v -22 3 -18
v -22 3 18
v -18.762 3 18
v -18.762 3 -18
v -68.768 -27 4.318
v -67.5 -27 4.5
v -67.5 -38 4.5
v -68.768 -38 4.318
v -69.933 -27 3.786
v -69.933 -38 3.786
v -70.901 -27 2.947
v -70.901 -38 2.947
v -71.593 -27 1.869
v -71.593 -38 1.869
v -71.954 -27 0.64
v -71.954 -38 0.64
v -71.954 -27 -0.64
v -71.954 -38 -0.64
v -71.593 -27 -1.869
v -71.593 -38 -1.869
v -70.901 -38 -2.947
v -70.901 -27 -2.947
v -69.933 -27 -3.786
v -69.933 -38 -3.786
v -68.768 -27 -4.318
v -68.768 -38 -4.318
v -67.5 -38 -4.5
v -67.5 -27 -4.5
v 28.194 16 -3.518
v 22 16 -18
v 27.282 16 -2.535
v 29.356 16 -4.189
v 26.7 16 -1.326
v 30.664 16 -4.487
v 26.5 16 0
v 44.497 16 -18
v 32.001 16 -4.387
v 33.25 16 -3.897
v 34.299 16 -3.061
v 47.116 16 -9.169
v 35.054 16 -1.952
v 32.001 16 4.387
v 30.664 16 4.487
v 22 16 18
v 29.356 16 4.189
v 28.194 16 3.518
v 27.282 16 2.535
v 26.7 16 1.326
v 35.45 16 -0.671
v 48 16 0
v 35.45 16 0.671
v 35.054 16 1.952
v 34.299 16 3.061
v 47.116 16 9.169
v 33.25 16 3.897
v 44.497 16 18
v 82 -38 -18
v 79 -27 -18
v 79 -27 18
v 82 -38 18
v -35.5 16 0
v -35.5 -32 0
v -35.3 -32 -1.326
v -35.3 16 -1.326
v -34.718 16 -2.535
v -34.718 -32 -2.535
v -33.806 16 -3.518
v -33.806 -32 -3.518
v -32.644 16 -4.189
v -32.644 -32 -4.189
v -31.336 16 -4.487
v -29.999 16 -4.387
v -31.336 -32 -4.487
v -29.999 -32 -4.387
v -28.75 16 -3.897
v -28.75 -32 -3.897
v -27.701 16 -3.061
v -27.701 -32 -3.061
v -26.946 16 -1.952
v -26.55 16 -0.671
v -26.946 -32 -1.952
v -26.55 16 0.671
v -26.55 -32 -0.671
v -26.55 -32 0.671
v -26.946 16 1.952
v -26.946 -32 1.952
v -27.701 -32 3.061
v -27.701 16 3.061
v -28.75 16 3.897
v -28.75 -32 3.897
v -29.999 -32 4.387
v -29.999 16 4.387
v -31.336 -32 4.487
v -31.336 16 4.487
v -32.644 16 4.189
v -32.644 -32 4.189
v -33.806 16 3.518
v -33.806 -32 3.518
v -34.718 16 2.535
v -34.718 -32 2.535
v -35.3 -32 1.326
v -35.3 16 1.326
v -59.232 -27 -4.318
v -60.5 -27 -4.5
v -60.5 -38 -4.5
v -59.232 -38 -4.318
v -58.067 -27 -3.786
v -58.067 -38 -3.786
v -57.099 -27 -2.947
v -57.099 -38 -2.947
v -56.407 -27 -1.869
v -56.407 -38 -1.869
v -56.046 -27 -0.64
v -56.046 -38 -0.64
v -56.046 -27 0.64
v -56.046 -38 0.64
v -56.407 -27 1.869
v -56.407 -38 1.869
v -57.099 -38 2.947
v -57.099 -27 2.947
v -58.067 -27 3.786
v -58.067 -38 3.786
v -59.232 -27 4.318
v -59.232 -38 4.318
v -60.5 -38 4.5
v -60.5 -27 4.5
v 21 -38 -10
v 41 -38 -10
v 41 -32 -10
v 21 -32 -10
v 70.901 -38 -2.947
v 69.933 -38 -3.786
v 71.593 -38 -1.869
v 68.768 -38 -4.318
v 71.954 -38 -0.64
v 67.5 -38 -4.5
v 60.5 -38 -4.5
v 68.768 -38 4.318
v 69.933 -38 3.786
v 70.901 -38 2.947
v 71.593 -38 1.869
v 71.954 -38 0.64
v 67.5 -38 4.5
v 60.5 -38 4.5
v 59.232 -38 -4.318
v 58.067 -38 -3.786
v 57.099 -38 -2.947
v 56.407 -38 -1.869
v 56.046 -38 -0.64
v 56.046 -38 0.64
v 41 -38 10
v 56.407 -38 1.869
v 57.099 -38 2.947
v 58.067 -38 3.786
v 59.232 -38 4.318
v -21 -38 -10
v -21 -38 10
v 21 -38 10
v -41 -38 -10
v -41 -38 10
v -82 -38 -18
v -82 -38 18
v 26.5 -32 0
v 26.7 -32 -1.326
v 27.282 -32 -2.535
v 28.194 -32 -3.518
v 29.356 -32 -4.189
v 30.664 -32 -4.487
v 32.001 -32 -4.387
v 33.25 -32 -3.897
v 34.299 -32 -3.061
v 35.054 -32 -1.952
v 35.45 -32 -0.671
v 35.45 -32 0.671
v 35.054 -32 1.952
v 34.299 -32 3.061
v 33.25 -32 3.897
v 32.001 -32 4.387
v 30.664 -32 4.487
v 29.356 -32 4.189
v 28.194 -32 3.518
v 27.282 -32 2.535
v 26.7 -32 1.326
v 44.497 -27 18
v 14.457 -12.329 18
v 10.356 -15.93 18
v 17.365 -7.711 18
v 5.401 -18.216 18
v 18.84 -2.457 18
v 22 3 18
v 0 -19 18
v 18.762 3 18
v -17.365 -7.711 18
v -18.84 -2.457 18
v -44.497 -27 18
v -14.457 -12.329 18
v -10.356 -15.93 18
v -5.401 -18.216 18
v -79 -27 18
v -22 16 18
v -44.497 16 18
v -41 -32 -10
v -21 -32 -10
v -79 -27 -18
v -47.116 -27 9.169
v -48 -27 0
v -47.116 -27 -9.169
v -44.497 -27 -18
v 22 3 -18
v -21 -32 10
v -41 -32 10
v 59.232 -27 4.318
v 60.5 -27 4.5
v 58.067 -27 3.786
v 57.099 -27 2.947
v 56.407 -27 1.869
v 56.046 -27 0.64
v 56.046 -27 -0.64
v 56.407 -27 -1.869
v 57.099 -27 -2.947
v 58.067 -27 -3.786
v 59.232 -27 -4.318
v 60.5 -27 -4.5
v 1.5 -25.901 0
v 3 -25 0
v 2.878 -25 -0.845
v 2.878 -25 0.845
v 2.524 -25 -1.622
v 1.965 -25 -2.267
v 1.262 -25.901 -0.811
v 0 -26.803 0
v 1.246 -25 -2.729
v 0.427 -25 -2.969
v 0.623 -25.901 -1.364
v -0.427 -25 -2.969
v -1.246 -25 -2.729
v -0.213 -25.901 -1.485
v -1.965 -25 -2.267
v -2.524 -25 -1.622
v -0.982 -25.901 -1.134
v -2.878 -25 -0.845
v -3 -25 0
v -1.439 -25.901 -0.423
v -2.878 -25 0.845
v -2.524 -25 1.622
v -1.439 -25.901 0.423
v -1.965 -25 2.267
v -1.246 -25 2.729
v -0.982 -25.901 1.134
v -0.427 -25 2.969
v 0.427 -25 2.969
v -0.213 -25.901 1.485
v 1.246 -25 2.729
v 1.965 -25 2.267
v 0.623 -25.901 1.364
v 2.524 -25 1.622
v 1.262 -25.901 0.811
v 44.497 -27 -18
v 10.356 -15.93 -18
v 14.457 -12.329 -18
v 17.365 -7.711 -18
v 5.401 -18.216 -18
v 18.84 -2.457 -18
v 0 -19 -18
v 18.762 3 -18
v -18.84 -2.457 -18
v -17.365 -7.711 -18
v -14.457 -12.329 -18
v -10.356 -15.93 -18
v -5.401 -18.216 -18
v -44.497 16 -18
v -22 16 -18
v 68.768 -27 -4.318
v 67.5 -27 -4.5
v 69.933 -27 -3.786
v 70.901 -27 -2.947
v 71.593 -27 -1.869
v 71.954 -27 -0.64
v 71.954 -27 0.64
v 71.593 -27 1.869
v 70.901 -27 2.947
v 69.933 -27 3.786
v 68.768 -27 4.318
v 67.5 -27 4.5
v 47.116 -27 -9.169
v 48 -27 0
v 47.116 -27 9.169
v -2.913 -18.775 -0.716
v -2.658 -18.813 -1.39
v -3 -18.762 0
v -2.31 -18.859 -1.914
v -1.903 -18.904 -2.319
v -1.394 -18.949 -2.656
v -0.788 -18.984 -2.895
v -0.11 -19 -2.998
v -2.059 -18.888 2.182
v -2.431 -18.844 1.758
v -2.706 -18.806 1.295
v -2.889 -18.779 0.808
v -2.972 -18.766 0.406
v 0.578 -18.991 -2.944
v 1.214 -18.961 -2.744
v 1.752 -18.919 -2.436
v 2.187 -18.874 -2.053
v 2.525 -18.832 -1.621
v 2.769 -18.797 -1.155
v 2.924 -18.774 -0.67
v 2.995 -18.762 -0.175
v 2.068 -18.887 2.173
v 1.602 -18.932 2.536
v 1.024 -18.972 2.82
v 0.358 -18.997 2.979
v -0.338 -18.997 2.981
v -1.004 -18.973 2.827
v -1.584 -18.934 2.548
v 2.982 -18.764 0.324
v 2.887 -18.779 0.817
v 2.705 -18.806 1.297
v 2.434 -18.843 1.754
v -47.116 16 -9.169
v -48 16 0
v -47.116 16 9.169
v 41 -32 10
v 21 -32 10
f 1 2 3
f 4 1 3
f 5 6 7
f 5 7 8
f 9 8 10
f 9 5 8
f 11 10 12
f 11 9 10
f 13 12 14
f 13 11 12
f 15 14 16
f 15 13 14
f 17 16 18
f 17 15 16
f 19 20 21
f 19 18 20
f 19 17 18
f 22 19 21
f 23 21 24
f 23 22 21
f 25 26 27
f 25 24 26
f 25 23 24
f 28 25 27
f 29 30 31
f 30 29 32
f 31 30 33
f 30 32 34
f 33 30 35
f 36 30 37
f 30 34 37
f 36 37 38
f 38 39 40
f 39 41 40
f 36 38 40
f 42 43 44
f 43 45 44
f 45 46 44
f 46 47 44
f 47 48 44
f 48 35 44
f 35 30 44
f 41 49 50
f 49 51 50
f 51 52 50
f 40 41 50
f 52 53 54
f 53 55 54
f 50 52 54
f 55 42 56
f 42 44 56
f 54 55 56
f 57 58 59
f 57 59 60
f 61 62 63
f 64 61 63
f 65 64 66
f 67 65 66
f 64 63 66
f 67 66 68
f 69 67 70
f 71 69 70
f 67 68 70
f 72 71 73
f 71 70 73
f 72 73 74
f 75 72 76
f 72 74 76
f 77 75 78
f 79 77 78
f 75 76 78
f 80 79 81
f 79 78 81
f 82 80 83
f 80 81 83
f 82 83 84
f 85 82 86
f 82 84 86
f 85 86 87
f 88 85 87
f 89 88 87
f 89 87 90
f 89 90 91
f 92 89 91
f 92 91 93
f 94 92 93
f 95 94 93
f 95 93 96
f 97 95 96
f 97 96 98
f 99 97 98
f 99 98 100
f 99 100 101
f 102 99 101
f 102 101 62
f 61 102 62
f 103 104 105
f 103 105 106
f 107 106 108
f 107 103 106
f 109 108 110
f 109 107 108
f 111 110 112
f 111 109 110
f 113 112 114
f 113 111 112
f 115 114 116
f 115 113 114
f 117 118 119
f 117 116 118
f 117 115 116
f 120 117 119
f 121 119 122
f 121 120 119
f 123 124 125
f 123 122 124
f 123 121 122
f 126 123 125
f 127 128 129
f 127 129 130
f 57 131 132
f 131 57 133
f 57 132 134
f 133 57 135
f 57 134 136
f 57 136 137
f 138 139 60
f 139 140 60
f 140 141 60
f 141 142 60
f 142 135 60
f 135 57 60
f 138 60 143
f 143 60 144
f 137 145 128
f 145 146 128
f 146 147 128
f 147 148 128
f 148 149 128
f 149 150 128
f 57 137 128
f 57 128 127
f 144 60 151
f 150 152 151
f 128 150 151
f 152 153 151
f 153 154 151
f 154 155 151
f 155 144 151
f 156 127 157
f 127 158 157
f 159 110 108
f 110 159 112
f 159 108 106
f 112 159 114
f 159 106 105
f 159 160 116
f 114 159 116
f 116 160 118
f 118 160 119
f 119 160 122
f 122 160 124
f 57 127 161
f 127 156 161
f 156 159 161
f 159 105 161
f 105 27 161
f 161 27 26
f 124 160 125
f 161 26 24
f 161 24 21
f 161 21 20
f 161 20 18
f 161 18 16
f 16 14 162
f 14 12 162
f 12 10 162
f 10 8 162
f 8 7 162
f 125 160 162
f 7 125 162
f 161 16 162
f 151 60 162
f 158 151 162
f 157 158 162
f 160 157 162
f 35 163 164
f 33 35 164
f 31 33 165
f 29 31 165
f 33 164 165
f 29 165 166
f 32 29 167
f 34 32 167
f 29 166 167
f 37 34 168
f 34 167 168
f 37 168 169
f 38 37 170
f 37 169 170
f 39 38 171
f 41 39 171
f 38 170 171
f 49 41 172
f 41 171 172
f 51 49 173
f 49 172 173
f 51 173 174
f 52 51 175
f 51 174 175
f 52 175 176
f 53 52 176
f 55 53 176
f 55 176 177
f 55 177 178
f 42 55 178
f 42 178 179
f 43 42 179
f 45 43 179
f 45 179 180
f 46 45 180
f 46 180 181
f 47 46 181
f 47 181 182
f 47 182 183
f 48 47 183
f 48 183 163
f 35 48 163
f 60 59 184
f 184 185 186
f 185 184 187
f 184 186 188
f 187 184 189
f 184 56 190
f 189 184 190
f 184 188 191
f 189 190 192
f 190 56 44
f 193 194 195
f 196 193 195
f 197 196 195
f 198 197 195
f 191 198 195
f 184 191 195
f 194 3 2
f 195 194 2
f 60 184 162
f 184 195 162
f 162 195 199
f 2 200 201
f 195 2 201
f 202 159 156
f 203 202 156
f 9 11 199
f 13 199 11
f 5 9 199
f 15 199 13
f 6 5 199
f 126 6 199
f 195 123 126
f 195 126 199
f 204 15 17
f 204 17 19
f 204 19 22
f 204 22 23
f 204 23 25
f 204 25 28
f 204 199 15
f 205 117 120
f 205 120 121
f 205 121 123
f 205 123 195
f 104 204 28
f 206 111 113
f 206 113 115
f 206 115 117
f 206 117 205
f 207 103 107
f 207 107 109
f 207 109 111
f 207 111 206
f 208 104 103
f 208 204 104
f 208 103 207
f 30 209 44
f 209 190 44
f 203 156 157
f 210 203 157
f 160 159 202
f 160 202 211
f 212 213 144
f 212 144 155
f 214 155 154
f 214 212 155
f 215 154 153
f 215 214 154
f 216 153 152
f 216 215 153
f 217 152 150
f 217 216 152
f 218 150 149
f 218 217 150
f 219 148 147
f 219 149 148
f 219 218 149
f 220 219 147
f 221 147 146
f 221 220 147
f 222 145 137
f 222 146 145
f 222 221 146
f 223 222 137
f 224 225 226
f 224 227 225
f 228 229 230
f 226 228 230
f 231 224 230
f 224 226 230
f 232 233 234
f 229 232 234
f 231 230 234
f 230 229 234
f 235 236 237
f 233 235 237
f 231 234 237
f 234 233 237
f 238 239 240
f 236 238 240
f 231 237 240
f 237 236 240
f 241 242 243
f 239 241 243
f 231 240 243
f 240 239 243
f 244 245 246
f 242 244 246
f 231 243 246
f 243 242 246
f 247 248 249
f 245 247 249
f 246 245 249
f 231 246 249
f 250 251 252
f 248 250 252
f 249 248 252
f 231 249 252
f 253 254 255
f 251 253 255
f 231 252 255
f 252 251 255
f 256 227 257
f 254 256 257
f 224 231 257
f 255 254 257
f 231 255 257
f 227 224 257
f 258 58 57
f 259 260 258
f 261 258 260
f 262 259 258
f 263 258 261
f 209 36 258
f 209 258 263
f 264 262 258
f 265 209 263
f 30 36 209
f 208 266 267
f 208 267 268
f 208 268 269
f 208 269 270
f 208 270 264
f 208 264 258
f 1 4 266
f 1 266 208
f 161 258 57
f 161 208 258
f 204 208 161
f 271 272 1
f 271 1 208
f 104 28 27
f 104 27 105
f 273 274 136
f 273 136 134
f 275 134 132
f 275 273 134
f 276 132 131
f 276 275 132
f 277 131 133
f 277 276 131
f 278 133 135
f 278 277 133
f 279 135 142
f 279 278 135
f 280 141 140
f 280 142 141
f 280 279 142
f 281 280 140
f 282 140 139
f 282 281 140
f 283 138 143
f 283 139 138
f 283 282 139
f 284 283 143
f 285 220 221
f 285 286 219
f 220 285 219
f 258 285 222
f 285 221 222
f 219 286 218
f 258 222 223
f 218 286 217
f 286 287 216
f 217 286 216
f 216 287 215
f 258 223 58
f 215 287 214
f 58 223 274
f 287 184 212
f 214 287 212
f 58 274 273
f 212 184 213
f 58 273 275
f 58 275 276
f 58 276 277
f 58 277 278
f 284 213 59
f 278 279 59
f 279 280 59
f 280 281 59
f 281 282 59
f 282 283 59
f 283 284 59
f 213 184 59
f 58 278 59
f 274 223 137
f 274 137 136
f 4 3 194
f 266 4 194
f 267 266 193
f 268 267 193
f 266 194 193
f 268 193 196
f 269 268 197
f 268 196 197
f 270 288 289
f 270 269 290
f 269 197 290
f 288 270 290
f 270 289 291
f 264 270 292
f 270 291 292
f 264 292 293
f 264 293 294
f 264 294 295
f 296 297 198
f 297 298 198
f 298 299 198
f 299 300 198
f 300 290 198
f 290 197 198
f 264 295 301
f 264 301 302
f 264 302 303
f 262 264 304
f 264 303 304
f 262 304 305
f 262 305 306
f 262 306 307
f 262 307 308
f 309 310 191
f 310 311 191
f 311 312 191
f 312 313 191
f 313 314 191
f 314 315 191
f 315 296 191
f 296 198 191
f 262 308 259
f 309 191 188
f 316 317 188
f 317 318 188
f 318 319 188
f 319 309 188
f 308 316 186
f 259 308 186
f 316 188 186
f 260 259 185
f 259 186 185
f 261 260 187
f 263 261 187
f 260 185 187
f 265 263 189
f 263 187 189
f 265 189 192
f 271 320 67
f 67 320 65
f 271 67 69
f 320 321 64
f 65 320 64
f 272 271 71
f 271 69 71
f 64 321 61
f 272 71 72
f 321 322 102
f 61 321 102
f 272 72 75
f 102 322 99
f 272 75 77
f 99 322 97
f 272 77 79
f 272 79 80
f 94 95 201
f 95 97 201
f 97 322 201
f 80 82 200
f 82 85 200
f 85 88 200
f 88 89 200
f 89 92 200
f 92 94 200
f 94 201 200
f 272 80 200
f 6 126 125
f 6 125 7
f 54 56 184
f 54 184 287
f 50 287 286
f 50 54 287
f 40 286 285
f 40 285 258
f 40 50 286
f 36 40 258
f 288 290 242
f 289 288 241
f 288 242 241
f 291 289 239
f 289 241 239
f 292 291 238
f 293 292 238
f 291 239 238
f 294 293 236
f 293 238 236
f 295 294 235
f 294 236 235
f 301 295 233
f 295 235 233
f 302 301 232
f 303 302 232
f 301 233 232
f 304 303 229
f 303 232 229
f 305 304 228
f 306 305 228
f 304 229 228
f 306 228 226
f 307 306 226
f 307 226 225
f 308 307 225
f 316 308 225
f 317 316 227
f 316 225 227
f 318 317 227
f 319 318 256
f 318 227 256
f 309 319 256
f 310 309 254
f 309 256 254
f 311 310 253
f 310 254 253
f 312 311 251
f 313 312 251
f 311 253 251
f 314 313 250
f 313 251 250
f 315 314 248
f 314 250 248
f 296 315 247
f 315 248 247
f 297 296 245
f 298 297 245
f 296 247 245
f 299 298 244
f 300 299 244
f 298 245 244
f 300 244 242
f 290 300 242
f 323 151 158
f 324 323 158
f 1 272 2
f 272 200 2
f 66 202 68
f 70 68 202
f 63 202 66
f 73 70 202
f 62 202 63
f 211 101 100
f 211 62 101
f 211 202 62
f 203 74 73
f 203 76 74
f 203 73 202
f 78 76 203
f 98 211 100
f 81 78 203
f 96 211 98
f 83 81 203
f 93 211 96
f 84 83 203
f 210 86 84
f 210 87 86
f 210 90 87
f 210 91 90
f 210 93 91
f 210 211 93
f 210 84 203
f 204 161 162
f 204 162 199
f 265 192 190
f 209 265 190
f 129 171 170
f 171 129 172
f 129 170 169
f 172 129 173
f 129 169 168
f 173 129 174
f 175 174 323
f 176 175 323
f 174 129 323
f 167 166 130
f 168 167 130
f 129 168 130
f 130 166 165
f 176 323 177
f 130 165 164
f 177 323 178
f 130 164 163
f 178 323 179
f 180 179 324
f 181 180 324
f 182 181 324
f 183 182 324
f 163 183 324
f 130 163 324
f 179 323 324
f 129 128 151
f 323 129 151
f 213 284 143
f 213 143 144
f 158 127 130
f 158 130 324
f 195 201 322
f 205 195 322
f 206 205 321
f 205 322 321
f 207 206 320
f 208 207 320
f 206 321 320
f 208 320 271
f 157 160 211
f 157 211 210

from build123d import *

# Parameters (mm, degrees)
BOSS_EXTRUDE1_DEPTH       = 18
F_1_0MM_DOWEL_HOLE3_D     = 9
SKETCH12_W                = 20
SKETCH12_H                = 20
CUT_EXTRUDE2_DEPTH        = 6
CUT_EXTRUDE3_DEPTH        = 12
CUT_EXTRUDE4_DEPTH        = 43
F_1_0MM_DOWEL_HOLE4_D     = 6
F_1_0MM_DOWEL_HOLE4_DEPTH = 6
F_1_0MM_DOWEL_HOLE4_TIP   = 1.802581857


with BuildPart() as part:
    # Sketch2 → Boss-Extrude1 (new body, symmetric)
    with BuildSketch(Plane.XY):
        with BuildLine():
            Line((18.761663039, 3), (22, 3))
            Line((22, 3), (22, 16))
            Line((22, 16), (50, 16))
            Line((50, 16), (50, -27))
            Line((50, -27), (79, -27))
            Line((79, -27), (82, -38))
            Line((82, -38), (-82, -38))
            Line((-82, -38), (-79, -27))
            Line((-79, -27), (-50, -27))
            Line((-50, -27), (-50, 16))
            Line((-50, 16), (-22, 16))
            Line((-22, 16), (-22, 3))
            Line((-22, 3), (-18.761663039, 3))
            ThreePointArc((-18.761663039, 3), (0, -19), (18.761663039, 3))
        make_face()
    extrude(amount=BOSS_EXTRUDE1_DEPTH, both=True)

    # Ø1.0mm Dowel Hole3 (through all)
    with Locations(Plane(origin=(0, 16, 0), x_dir=(1, 0, 0), z_dir=(0, 1, 0))):
        with Locations((-31, 0), (31, 0)):
            Hole(F_1_0MM_DOWEL_HOLE3_D / 2)

    # Sketch12 → Cut-Extrude2 (cut)
    with BuildSketch(Plane.XZ.offset(38)):
        with Locations((-31, 0)):
            Rectangle(SKETCH12_W, SKETCH12_H)
    cut_extrude2 = extrude(amount=-CUT_EXTRUDE2_DEPTH, mode=Mode.SUBTRACT)

    # Sketch13 → Cut-Extrude3 (cut, through all)
    with BuildSketch(Plane(origin=(0, -27, 0), x_dir=(1, 0, 0), z_dir=(0, 1, 0))):
        with BuildLine():
            Line((-67.5, 4.5), (-60.5, 4.5))
            ThreePointArc((-60.5, 4.5), (-56, 0), (-60.5, -4.5))
            Line((-60.5, -4.5), (-67.5, -4.5))
            ThreePointArc((-67.5, -4.5), (-72, 0), (-67.5, 4.5))
        make_face()
        with BuildLine():
            Line((60.5, 4.5), (67.5, 4.5))
            ThreePointArc((67.5, 4.5), (72, 0), (67.5, -4.5))
            Line((67.5, -4.5), (60.5, -4.5))
            ThreePointArc((60.5, -4.5), (56, 0), (60.5, 4.5))
        make_face()
    extrude(amount=-CUT_EXTRUDE3_DEPTH, mode=Mode.SUBTRACT)

    # Mirror1: Cut-Extrude2 across plane
    add(cut_extrude2.mirror(Plane(origin=(0, 0, 0), x_dir=(0, 0, 1), z_dir=(1, 0, 0))), mode=Mode.SUBTRACT)

    # Sketch17 → Cut-Extrude4 (cut)
    with BuildSketch(Plane(origin=(0, 16, 0), x_dir=(1, 0, 0), z_dir=(0, 1, 0))):
        with BuildLine():
            Line((-44.497190923, 18), (-50, 18))
            Line((-50, 18), (-50, -18))
            Line((-50, -18), (-44.497190923, -18))
            ThreePointArc((-44.497190923, -18), (-48, 0), (-44.497190923, 18))
        make_face()
    cut_extrude4 = extrude(amount=-CUT_EXTRUDE4_DEPTH, mode=Mode.SUBTRACT)

    # Mirror3: Cut-Extrude4 across plane
    add(cut_extrude4.mirror(Plane(origin=(0, 0, 0), x_dir=(0, 0, 1), z_dir=(1, 0, 0))), mode=Mode.SUBTRACT)

    # Ø1.0mm Dowel Hole4
    with Locations(Plane(origin=(0, -19, 0), x_dir=(1, 0, 0), z_dir=(0, 1, 0))):
        with Locations((0, 0)):
            Hole(F_1_0MM_DOWEL_HOLE4_D / 2, depth=F_1_0MM_DOWEL_HOLE4_DEPTH)
            with Locations((0, 0, -(F_1_0MM_DOWEL_HOLE4_DEPTH + F_1_0MM_DOWEL_HOLE4_TIP / 2))):  # 118° drill point
                Cone(0, F_1_0MM_DOWEL_HOLE4_D / 2, F_1_0MM_DOWEL_HOLE4_TIP, mode=Mode.SUBTRACT)


solid = part.part
